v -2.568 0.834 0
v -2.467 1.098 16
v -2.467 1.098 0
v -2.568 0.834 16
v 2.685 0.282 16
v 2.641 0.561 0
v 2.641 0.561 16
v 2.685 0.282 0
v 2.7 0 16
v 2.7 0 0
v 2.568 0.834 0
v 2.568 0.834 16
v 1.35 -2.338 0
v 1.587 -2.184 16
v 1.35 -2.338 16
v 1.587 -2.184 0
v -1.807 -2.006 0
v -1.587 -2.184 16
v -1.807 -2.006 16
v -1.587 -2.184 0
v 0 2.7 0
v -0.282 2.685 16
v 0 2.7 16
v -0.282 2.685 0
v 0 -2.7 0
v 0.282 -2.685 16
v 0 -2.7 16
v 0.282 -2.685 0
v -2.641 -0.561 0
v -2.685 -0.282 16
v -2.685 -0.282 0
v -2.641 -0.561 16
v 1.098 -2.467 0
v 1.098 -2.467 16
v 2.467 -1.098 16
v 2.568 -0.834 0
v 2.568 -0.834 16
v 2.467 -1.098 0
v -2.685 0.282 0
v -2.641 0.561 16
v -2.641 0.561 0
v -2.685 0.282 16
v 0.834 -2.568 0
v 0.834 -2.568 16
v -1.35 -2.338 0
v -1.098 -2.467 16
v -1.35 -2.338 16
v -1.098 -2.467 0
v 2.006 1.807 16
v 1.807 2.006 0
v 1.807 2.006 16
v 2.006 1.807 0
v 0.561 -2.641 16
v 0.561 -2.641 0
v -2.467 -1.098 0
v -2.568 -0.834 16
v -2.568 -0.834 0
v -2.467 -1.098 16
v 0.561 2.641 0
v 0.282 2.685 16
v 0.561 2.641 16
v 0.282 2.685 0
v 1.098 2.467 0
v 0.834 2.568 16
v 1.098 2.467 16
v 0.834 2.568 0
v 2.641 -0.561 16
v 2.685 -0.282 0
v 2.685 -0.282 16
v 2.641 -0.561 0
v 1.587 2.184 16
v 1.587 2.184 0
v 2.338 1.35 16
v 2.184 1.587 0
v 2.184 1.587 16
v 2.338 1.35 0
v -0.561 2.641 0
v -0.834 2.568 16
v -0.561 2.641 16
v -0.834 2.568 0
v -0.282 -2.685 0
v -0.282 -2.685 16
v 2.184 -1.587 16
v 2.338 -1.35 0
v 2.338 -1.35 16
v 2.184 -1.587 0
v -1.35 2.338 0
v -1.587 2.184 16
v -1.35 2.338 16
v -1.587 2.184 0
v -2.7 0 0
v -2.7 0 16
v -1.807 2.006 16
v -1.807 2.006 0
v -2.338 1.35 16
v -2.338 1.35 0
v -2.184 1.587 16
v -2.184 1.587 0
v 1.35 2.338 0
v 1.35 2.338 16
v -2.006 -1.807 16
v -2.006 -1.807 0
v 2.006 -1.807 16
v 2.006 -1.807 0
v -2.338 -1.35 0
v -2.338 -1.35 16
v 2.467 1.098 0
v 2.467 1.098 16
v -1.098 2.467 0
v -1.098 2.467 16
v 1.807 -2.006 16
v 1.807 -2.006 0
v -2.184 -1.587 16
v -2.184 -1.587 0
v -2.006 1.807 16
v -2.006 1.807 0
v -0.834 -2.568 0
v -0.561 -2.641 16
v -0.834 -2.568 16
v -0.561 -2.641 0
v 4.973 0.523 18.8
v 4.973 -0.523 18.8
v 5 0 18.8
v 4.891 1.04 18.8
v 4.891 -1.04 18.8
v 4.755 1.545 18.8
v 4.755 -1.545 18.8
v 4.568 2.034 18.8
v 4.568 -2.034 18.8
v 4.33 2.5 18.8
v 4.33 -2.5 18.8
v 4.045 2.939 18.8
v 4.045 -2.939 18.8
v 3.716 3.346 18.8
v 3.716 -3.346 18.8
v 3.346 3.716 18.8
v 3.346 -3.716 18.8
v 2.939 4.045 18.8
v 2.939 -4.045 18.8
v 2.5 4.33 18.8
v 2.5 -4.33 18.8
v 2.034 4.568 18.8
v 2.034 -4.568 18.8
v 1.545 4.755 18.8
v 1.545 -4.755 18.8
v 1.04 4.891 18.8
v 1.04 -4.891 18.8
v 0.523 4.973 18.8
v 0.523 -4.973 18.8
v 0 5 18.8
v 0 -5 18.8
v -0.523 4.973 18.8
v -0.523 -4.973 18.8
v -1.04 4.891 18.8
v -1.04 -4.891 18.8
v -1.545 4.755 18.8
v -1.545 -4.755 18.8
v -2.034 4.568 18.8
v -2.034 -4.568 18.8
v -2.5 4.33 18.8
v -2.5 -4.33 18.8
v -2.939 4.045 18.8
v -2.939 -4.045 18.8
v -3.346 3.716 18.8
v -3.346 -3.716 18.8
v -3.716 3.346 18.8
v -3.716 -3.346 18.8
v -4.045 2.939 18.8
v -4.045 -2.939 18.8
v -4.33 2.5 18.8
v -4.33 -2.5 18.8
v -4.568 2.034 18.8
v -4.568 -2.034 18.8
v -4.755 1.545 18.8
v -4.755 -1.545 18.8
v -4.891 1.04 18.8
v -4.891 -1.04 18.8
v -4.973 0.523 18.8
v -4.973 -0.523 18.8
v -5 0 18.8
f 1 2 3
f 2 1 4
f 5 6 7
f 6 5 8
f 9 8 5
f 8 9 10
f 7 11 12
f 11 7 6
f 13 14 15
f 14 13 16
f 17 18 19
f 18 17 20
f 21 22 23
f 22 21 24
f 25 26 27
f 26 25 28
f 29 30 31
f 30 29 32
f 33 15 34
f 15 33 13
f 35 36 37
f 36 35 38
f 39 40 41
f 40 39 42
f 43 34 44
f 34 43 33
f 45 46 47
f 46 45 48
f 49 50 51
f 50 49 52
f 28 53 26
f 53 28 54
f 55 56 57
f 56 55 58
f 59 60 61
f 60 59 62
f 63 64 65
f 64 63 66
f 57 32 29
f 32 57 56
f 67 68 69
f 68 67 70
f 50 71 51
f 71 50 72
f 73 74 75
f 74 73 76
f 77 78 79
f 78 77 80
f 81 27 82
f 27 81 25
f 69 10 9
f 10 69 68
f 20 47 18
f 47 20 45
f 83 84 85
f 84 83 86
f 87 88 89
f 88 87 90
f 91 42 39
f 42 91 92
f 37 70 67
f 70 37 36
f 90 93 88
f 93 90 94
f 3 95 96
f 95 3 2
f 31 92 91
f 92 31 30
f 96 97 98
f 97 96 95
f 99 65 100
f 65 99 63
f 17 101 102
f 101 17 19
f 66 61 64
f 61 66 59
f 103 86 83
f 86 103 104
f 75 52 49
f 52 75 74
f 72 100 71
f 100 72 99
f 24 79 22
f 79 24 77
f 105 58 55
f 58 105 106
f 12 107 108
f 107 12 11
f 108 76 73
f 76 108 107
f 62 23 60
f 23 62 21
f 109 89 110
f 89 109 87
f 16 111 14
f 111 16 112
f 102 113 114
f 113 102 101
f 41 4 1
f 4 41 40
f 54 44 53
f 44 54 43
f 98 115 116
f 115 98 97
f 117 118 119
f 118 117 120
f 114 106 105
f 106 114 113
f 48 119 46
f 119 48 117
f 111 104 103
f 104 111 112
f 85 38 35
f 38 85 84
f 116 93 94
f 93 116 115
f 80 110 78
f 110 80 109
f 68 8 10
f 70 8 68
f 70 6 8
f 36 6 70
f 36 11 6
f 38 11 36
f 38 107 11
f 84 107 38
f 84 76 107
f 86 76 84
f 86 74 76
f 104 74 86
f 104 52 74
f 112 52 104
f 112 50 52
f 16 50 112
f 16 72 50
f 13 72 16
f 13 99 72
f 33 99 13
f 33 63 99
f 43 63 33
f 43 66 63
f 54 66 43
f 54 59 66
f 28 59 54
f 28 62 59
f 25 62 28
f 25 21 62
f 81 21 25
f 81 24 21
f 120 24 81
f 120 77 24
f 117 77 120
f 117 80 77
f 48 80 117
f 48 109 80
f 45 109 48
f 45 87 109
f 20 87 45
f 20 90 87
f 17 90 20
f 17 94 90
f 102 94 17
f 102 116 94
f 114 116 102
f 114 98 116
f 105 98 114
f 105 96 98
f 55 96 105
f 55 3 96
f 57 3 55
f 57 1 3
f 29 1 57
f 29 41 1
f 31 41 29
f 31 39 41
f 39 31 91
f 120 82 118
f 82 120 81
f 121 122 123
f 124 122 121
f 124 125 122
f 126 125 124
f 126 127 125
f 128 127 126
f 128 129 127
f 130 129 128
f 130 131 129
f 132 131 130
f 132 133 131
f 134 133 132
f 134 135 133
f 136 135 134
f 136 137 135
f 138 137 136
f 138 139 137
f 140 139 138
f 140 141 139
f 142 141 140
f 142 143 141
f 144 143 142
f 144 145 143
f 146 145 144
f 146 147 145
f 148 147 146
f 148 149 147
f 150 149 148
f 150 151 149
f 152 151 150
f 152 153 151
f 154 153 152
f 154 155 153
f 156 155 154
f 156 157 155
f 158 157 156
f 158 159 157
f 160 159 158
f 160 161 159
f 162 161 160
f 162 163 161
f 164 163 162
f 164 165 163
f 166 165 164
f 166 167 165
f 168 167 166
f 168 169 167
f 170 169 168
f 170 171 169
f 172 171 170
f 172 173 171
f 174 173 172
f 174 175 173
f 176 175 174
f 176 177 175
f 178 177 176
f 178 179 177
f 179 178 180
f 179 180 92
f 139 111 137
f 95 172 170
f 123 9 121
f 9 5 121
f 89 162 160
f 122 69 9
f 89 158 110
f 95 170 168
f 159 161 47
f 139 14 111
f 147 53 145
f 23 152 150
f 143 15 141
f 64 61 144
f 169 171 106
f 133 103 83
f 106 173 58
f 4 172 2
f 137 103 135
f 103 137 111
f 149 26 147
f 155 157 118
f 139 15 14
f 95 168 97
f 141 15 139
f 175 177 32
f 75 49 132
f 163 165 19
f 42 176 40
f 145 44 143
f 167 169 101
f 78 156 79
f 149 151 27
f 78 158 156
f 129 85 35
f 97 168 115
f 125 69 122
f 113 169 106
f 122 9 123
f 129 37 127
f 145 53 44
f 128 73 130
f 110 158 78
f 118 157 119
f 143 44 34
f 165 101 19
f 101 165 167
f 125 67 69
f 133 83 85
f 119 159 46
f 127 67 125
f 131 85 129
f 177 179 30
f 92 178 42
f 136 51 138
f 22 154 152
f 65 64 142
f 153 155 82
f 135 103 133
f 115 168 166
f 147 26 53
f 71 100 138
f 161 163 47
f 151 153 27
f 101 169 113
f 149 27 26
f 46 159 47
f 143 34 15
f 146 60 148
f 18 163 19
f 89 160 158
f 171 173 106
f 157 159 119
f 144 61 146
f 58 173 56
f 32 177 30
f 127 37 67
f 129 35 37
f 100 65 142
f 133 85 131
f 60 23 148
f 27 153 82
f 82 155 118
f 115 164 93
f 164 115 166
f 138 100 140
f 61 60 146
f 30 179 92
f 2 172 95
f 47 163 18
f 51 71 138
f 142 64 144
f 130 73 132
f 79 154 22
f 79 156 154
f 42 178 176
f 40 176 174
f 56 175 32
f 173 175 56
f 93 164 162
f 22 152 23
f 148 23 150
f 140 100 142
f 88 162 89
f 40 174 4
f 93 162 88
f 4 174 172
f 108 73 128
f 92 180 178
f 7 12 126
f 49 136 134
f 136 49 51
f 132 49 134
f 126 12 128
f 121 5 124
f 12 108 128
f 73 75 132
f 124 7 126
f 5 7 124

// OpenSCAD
// Countersunk screw with 90-degree conical head.
$fn = 60;
eps = 0.02;
shaft_d = 5.4;
head_d = 10;
head_h = 2.8;
shaft_l = 16;
union() {
    cylinder(d = shaft_d, h = shaft_l);
    translate([0, 0, shaft_l]) cylinder(d1 = shaft_d, d2 = head_d, h = head_h);
}
